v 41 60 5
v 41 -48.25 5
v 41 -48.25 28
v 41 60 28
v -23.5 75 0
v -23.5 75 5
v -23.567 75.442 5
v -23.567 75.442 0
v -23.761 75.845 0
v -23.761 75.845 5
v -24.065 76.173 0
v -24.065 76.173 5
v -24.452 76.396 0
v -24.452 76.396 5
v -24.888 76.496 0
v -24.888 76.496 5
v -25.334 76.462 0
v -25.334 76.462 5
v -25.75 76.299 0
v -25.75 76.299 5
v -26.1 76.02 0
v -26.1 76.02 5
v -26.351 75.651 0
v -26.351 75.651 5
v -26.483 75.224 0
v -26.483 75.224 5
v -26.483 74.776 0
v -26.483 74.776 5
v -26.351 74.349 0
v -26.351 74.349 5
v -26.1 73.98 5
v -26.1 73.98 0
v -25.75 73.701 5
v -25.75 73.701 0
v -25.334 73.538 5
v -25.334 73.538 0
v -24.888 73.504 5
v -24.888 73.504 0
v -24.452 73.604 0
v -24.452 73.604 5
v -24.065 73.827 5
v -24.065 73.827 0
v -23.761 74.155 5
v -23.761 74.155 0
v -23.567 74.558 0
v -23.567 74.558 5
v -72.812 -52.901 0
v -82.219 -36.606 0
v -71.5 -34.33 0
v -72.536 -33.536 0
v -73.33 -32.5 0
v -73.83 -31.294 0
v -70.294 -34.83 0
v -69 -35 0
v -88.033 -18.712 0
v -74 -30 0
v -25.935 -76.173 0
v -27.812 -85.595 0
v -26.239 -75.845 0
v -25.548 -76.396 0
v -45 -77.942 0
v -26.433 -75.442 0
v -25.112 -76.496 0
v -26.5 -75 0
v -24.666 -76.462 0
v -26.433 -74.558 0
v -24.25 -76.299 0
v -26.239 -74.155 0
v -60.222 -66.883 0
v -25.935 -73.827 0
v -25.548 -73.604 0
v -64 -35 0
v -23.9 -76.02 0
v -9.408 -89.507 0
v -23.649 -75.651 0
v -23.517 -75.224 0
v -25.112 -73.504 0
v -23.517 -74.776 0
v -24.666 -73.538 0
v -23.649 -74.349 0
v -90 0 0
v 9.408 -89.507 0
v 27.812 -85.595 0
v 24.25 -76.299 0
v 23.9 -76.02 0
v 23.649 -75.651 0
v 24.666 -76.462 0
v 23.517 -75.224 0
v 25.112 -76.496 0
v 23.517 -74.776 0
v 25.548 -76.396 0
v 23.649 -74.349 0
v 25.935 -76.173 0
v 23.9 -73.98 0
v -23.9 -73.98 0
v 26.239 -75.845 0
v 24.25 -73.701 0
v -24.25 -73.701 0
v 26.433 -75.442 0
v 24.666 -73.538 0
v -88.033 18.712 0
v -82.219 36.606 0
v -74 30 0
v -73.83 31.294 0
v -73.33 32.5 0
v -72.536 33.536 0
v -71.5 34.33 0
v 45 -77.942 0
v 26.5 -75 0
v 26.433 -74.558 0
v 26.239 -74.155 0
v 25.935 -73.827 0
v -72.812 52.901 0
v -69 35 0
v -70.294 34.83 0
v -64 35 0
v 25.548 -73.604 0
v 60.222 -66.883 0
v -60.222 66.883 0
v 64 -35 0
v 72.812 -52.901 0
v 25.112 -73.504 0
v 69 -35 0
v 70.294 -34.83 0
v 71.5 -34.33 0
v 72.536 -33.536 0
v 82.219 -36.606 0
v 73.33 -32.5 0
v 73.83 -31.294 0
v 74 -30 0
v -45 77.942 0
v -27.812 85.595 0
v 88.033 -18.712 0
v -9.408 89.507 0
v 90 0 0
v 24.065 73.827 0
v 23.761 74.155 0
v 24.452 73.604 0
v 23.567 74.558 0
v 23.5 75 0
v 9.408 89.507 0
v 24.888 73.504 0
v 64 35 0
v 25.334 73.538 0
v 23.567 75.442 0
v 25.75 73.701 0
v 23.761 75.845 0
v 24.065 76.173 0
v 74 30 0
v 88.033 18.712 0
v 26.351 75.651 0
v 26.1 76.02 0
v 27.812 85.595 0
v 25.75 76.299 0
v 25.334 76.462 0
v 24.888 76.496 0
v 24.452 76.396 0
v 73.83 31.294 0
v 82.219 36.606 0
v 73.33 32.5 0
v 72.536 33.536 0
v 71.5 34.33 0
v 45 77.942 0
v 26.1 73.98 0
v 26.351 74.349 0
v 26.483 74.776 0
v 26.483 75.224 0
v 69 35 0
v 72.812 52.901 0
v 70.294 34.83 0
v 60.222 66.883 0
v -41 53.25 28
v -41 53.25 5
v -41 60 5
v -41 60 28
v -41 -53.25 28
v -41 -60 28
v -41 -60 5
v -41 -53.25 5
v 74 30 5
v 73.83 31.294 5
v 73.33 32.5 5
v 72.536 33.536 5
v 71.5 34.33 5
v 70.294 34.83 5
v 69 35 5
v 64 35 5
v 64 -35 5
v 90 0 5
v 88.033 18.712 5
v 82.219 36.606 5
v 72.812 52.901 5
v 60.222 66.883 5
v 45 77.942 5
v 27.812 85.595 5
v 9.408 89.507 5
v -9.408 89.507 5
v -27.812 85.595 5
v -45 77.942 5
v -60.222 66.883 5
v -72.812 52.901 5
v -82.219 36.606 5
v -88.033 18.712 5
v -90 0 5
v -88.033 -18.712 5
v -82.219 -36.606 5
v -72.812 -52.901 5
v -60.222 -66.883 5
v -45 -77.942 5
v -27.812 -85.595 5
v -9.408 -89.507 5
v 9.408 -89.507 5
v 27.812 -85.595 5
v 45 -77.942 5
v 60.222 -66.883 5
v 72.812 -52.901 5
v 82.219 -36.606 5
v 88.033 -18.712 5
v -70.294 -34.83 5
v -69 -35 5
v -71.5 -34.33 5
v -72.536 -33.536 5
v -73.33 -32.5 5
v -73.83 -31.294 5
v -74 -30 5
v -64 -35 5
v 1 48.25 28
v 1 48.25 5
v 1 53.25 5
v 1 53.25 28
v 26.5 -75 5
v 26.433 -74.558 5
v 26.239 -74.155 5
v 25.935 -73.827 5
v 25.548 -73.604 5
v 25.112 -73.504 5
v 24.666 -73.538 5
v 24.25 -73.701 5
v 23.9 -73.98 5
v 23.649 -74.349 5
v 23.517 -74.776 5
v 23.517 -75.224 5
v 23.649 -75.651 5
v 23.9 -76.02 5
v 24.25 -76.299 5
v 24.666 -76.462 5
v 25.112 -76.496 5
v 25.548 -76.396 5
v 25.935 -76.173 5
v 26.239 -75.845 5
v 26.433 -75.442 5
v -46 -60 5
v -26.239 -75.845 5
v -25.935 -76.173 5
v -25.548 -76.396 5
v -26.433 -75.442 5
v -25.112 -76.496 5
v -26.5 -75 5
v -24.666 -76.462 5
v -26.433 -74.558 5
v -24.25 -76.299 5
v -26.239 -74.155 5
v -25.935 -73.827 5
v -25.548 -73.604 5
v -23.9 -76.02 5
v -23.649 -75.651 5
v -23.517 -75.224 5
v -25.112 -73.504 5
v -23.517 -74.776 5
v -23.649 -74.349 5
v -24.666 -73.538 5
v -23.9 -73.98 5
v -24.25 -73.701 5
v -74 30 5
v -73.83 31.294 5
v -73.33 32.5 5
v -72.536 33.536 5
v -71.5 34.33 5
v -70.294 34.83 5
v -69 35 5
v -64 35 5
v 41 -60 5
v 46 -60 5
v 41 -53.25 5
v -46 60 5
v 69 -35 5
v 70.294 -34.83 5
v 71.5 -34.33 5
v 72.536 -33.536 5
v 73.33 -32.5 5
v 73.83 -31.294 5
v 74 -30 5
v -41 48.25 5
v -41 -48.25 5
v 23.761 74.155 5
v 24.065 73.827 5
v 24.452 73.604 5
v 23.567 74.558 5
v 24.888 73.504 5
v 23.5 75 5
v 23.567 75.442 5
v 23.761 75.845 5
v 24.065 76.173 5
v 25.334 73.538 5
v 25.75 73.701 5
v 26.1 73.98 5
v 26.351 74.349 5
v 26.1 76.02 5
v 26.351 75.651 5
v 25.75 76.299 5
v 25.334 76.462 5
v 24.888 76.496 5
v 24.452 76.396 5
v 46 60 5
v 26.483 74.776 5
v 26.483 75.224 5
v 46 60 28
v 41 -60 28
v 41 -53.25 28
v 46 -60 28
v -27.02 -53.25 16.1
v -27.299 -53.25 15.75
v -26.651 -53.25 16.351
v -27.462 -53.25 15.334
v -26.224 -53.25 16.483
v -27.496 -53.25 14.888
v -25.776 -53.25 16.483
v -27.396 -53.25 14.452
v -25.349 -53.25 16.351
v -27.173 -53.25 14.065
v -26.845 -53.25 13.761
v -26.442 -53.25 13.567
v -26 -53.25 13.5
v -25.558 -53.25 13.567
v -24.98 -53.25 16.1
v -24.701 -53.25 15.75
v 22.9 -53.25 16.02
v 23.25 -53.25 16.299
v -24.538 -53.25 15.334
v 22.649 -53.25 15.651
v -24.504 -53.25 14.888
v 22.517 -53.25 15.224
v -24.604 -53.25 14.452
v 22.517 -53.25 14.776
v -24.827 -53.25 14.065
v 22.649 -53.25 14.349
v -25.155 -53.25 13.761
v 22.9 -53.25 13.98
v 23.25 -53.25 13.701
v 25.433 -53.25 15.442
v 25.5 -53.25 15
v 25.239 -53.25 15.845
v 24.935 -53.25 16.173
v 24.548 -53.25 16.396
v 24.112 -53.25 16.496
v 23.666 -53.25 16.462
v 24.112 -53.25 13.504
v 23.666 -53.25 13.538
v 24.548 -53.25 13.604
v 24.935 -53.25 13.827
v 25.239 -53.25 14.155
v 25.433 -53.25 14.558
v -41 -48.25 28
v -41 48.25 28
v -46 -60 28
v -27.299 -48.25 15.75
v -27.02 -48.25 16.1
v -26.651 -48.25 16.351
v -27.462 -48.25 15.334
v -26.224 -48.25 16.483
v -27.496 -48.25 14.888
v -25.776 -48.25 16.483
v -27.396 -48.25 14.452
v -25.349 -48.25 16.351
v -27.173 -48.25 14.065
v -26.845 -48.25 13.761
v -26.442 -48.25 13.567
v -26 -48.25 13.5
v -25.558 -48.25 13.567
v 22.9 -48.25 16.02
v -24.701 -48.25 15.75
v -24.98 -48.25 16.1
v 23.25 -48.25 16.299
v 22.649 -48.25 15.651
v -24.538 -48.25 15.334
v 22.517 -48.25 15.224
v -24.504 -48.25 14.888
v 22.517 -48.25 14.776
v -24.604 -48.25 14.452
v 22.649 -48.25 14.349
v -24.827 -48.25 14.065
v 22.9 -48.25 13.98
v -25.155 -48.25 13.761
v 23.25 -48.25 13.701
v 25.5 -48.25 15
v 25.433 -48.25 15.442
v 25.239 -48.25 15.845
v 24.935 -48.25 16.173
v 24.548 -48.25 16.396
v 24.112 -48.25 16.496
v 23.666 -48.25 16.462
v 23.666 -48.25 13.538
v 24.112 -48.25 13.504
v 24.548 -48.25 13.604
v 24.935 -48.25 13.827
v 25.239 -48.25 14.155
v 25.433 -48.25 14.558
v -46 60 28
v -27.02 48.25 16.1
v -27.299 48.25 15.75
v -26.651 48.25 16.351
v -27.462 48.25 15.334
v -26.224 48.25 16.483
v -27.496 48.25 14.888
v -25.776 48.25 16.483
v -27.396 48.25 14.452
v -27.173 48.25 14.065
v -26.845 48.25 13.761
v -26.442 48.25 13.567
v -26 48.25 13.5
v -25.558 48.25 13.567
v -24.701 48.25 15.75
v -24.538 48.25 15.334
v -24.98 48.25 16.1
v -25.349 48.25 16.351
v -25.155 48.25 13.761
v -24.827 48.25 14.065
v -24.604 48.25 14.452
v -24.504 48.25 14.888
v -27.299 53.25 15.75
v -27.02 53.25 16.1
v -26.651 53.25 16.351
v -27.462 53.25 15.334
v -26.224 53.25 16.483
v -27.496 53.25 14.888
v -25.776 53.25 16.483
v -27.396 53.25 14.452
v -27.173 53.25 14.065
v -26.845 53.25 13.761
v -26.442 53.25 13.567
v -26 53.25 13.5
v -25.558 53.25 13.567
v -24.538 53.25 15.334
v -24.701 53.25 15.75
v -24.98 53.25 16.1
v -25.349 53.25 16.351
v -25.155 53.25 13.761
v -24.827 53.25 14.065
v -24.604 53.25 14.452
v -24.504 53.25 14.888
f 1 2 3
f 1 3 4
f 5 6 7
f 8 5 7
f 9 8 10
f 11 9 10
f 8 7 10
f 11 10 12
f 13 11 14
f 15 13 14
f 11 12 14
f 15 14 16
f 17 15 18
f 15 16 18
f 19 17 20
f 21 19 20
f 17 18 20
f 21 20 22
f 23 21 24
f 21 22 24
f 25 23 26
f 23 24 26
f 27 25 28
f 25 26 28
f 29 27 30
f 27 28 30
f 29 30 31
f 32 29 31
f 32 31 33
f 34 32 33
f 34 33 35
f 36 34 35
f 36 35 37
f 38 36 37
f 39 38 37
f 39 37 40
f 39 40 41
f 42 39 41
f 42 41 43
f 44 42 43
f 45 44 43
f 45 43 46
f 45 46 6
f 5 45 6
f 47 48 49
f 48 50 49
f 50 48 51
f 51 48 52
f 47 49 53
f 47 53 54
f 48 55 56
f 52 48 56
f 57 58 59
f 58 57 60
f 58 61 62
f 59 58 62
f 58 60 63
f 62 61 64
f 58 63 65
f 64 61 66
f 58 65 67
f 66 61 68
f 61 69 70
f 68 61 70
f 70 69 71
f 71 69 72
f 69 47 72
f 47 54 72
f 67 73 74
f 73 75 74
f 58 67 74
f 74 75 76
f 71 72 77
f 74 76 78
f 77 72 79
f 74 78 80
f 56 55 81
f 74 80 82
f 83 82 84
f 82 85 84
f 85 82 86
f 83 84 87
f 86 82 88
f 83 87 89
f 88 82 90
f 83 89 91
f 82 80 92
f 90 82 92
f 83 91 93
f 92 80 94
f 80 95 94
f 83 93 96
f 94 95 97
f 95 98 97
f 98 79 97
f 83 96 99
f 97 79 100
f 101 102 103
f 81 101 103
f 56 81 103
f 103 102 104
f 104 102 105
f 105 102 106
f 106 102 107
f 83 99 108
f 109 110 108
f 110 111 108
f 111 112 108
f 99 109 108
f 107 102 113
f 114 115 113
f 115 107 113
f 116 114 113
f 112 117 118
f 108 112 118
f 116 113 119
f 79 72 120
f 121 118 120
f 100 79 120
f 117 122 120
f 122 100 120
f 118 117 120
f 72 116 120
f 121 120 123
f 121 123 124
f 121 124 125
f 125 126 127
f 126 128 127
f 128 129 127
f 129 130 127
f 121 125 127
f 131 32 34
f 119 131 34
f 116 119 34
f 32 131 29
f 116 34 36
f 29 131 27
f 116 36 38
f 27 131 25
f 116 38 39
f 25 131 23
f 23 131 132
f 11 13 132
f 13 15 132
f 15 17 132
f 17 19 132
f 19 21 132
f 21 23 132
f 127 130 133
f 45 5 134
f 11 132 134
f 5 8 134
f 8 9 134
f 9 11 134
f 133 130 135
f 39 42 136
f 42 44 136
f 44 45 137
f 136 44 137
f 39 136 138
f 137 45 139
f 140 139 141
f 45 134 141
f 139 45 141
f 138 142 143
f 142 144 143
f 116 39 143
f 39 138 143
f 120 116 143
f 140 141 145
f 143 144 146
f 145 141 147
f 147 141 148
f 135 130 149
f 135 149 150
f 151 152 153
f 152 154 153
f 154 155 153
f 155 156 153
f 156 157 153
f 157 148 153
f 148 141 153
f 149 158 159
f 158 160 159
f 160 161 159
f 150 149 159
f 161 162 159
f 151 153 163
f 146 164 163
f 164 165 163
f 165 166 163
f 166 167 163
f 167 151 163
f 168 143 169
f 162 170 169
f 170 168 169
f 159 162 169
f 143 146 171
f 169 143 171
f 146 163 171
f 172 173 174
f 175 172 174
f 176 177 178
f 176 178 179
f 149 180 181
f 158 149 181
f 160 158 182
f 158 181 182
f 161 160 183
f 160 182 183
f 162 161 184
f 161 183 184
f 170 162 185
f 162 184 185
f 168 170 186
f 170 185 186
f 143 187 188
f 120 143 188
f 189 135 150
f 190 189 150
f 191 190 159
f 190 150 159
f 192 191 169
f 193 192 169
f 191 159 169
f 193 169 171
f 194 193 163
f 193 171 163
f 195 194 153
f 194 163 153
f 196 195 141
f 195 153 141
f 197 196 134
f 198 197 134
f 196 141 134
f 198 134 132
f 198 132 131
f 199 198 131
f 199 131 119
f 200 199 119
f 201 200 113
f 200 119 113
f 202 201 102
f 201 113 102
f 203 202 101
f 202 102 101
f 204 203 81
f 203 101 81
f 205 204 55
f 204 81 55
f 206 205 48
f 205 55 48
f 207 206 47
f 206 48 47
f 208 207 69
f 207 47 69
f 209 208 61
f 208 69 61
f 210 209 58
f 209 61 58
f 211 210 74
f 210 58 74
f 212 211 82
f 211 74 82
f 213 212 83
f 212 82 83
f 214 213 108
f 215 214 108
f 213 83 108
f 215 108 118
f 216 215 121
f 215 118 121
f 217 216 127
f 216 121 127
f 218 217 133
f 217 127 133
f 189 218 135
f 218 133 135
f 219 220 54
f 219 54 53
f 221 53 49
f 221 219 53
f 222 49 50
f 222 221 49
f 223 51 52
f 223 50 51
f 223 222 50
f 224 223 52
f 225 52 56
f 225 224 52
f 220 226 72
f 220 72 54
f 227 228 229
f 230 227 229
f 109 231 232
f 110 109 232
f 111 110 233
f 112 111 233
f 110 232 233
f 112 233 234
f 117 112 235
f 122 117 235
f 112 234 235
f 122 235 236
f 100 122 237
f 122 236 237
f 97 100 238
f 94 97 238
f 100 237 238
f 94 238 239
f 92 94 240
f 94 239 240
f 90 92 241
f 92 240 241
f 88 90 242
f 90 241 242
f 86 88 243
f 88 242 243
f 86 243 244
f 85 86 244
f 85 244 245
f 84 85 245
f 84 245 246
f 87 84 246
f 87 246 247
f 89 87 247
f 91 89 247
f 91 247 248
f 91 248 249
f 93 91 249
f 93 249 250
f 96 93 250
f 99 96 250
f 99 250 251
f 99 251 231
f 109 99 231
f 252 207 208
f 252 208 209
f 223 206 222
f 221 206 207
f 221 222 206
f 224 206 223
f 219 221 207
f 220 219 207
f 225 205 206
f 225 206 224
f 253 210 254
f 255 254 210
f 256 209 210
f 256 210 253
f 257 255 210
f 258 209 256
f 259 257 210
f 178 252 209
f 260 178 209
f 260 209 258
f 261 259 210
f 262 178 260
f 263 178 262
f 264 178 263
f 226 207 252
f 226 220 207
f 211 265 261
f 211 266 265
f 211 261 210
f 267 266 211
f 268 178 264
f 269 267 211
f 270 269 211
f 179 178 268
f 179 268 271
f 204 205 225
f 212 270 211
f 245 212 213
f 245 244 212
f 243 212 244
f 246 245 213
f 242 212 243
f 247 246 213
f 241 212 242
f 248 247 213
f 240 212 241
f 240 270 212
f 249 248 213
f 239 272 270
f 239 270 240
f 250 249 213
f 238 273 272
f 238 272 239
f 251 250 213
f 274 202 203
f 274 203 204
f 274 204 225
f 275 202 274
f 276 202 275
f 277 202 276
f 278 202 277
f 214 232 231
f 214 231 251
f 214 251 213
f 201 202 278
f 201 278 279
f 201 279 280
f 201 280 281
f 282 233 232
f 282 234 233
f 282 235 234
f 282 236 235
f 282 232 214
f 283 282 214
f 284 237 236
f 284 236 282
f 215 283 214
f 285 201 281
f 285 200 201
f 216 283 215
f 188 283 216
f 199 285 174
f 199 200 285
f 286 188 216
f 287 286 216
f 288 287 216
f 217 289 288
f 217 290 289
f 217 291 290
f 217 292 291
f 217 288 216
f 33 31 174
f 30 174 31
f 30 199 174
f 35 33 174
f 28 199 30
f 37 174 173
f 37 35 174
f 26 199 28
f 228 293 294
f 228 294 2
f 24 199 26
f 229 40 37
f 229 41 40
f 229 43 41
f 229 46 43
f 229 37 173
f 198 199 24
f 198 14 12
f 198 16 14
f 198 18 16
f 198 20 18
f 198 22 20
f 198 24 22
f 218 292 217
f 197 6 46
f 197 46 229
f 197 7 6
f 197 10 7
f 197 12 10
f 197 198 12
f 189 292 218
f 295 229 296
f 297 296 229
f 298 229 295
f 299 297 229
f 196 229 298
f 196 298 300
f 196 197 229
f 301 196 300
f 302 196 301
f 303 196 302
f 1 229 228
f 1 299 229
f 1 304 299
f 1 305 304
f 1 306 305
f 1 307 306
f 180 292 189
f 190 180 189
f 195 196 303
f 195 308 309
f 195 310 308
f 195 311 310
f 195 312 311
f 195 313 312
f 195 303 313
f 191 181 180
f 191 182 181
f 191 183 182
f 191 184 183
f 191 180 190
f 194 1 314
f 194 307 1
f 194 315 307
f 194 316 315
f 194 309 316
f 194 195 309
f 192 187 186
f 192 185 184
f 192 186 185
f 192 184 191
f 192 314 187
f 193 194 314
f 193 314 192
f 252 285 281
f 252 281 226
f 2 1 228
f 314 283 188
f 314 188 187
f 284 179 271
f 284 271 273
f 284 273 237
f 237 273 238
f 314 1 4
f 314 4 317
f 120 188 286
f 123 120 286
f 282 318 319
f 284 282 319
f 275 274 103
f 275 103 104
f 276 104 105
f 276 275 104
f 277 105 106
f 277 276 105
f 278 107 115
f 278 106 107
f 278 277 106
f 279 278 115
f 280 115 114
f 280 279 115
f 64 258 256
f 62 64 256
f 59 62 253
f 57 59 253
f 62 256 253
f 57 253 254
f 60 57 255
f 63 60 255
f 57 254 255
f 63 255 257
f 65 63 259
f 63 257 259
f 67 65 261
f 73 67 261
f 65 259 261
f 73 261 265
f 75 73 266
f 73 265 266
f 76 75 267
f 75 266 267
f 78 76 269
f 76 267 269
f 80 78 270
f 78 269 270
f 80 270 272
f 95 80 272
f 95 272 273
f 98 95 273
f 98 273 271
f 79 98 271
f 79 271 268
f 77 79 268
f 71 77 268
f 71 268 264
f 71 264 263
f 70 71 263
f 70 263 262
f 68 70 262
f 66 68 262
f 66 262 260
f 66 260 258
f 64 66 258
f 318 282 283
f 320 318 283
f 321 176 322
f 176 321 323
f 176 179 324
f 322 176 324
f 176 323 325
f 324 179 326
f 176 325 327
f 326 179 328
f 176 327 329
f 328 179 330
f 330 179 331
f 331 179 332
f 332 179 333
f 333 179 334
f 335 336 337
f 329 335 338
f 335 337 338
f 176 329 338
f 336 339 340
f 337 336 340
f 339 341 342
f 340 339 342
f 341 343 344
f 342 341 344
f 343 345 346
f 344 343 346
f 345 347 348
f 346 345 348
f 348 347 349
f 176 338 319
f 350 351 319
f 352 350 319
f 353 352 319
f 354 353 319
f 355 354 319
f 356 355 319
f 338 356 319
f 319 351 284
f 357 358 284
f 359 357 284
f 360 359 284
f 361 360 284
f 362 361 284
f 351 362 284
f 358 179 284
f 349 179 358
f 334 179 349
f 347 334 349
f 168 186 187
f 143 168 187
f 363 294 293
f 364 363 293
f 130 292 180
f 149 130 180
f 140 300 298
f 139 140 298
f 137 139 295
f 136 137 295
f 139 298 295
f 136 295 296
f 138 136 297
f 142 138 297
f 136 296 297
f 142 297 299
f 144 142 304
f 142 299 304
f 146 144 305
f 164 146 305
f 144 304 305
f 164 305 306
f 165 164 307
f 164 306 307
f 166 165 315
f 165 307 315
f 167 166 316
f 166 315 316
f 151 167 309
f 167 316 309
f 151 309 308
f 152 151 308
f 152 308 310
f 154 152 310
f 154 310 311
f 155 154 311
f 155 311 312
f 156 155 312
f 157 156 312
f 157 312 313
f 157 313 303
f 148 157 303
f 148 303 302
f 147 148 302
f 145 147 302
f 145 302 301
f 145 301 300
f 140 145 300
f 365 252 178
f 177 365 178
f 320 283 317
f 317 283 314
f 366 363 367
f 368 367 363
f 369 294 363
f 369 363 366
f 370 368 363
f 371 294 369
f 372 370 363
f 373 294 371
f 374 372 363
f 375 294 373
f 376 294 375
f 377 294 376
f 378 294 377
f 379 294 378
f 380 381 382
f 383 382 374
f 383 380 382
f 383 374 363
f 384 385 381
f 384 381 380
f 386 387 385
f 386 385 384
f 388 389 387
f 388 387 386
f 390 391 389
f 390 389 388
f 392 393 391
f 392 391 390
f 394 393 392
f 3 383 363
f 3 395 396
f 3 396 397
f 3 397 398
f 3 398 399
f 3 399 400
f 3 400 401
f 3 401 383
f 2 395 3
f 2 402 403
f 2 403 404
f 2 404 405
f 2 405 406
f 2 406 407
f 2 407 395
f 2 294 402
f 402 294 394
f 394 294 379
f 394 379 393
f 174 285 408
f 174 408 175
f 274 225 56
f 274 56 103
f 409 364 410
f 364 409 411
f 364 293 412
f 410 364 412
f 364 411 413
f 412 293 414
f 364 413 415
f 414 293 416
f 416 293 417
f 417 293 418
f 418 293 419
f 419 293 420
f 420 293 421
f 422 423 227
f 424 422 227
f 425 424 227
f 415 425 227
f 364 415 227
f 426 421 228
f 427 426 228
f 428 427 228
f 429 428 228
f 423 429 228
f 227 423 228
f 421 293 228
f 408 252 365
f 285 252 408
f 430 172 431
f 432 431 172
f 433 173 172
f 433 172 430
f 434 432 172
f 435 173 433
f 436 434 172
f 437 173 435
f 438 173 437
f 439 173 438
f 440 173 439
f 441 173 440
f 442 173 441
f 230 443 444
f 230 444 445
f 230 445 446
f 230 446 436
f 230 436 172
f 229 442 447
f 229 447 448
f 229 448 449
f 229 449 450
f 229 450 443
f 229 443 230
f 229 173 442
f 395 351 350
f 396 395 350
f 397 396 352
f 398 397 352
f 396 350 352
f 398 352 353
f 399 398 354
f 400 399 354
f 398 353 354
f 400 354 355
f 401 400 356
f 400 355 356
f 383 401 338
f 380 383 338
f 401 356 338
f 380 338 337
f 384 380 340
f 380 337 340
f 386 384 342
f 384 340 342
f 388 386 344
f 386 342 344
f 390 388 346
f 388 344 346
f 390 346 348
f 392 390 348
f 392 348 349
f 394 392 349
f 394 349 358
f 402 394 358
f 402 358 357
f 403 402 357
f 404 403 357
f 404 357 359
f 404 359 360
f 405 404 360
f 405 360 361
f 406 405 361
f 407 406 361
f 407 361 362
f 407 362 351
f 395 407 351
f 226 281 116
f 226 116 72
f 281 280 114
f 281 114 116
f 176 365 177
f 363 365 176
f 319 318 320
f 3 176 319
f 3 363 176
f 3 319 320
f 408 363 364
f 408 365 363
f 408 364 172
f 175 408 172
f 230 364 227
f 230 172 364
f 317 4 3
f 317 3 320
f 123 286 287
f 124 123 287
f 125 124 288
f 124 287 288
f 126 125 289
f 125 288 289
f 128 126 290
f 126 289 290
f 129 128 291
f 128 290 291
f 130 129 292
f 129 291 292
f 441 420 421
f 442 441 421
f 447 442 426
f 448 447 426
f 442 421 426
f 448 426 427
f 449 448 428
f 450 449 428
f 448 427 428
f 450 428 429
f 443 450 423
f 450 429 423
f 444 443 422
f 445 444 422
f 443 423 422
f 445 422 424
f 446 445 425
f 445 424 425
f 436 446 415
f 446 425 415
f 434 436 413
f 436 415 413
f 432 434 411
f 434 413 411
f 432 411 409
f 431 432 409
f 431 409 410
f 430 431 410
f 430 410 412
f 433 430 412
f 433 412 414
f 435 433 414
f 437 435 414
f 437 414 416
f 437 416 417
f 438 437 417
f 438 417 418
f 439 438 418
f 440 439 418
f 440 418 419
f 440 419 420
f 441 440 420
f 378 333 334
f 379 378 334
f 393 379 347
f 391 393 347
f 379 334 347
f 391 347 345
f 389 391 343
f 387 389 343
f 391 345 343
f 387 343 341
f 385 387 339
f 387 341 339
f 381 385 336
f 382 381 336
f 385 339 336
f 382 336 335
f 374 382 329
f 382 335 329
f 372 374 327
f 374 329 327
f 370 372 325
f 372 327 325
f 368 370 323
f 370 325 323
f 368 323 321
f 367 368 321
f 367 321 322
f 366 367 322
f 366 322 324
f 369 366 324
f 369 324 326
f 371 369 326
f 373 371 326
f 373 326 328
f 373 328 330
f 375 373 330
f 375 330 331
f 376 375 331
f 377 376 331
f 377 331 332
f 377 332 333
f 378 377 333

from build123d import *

# Parameters (mm, degrees)
SKETCH_1_R          = 90
EXTRUDE_1_DEPTH     = 5
CUT_EXTRUDE_1_DEPTH = 128.377392029
SKETCH_2_R          = 1.5
CUT_EXTRUDE_2_DEPTH = 128.377392029
SKETCH_4_W          = 5
SKETCH_4_H          = 120
EXTRUDE_2_DEPTH     = 23
SKETCH_5_W          = 82
SKETCH_5_H          = 5
SKETCH_5_W_2        = 42
EXTRUDE_3_DEPTH     = 23
SKETCH_6_R          = 1.5
CUT_EXTRUDE_3_DEPTH = 172.477585999


with BuildPart() as part:
    # 草圖1 → 填料-伸長1 (new body)
    with BuildSketch(Plane.XY):
        Circle(SKETCH_1_R)
    extrude(amount=EXTRUDE_1_DEPTH)

    # 草圖3 → 除料-伸長1 (cut, through all)
    with BuildSketch(Plane.XY.offset(5)):
        with BuildLine():
            ThreePointArc((-69, -35), (-72.535533906, -33.535533906), (-74, -30))
            Line((-74, -30), (-74, 30))
            ThreePointArc((-74, 30), (-72.535533906, 33.535533906), (-69, 35))
            Line((-69, 35), (-64, 35))
            Line((-64, 35), (-64, -35))
            Line((-64, -35), (-69, -35))
        make_face()
        with BuildLine():
            Line((64, 35), (64, -35))
            Line((64, -35), (69, -35))
            ThreePointArc((69, -35), (72.535533906, -33.535533906), (74, -30))
            Line((74, -30), (74, 30))
            ThreePointArc((74, 30), (72.535533906, 33.535533906), (69, 35))
            Line((69, 35), (64, 35))
        make_face()
    extrude(amount=-CUT_EXTRUDE_1_DEPTH, mode=Mode.SUBTRACT)

    # 草圖2 → 除料-伸長2 (cut, through all)
    with BuildSketch(Plane.XY.offset(5)):
        with Locations((-25, 75)):
            Circle(SKETCH_2_R)
        with Locations(Location((-25, -75, 0), (0, 0, 180))):
            Circle(SKETCH_2_R)
        with Locations(Location((25, 75, 0), (0, 0, 180))):
            Circle(SKETCH_2_R)
        with Locations((25, -75)):
            Circle(SKETCH_2_R)
    extrude(amount=-CUT_EXTRUDE_2_DEPTH, mode=Mode.SUBTRACT)

    # 草圖4 → 填料-伸長2 (add)
    with BuildSketch(Plane.XY.offset(5)):
        with Locations((-43.5, 0)):
            Rectangle(SKETCH_4_W, SKETCH_4_H)
        with Locations((43.5, 0)):
            Rectangle(SKETCH_4_W, SKETCH_4_H)
    extrude(amount=EXTRUDE_2_DEPTH)

    # 草圖5 → 填料-伸長3 (add)
    with BuildSketch(Plane.XY.offset(5)):
        with Locations((0, -50.75)):
            Rectangle(SKETCH_5_W, SKETCH_5_H)
        with Locations((-20, 50.75)):
            Rectangle(SKETCH_5_W_2, SKETCH_5_H)
    extrude(amount=EXTRUDE_3_DEPTH)

    # 草圖6 → 除料-伸長3 (cut, through all)
    with BuildSketch(Plane(origin=(0, -53.25, 0), x_dir=(-1, 0, 0), z_dir=(0, -1, 0))):
        with Locations(Location((26, -15, 0), (0, 0, 90))):
            Circle(SKETCH_6_R)
        with Locations(Location((-24, -15, 0), (0, 0, 180))):
            Circle(SKETCH_6_R)
    extrude(amount=-CUT_EXTRUDE_3_DEPTH, mode=Mode.SUBTRACT)


solid = part.part
